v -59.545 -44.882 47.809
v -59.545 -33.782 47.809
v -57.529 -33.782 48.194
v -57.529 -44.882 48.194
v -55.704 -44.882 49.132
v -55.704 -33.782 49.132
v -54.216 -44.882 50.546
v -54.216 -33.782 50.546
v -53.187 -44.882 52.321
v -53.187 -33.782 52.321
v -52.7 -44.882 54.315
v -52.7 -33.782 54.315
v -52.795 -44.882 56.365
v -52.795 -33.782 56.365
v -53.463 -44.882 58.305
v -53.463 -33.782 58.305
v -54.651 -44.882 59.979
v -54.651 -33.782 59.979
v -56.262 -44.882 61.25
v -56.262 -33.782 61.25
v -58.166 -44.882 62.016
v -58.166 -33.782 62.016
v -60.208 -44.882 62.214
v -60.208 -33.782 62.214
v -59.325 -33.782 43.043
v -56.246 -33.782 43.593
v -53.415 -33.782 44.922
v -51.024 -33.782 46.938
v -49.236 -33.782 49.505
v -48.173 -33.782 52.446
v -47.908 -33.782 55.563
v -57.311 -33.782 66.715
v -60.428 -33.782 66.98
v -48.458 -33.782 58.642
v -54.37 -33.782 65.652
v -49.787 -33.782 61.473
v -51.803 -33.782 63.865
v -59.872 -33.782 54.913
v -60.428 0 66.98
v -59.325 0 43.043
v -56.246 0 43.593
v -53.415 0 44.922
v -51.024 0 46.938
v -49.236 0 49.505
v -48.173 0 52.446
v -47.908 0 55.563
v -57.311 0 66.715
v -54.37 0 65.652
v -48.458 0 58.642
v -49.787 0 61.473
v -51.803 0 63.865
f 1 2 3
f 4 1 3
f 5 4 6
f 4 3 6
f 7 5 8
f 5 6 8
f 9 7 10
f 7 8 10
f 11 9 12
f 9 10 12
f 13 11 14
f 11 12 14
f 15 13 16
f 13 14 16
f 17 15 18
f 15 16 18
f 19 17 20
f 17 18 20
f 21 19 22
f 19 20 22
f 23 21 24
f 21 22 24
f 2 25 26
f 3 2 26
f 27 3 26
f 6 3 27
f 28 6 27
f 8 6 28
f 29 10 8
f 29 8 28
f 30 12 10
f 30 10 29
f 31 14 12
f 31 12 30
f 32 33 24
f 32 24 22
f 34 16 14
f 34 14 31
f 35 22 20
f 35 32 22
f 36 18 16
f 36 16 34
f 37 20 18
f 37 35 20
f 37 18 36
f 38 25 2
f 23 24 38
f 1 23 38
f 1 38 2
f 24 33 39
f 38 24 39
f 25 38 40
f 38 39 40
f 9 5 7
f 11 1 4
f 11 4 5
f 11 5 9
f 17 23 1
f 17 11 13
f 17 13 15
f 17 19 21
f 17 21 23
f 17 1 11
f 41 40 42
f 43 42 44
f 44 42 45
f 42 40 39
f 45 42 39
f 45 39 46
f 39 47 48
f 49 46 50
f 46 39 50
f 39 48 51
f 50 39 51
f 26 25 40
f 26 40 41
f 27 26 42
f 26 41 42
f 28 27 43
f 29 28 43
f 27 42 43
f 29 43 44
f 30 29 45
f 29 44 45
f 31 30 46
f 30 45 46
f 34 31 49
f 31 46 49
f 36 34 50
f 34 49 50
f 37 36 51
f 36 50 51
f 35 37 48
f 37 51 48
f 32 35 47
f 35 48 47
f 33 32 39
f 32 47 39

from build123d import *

# Parameters (mm, degrees)
F1_DEPTH = 33.782
F3_DEPTH = 11.0998


with BuildPart() as f1:
    # F0 (on Front) → F1 (new body)
    with BuildSketch(Plane.XZ):
        with BuildLine():
            Line((-60.427879, 66.98028), (-59.325351, 43.042825))
            ThreePointArc((-59.325351, 43.042825), (-47.907887, 55.562817), (-60.427879, 66.98028))
        make_face()
    extrude(amount=F1_DEPTH)

    # F2 (on face) → F3 (join)
    with BuildSketch(Plane.XZ.offset(33.782)):
        with BuildLine():
            Line((-60.208346, 62.213896), (-59.544884, 47.809209))
            ThreePointArc((-59.544884, 47.809209), (-52.674271, 55.343283), (-60.208346, 62.213896))
        make_face()
    extrude(amount=F3_DEPTH)


solid = f1.part
